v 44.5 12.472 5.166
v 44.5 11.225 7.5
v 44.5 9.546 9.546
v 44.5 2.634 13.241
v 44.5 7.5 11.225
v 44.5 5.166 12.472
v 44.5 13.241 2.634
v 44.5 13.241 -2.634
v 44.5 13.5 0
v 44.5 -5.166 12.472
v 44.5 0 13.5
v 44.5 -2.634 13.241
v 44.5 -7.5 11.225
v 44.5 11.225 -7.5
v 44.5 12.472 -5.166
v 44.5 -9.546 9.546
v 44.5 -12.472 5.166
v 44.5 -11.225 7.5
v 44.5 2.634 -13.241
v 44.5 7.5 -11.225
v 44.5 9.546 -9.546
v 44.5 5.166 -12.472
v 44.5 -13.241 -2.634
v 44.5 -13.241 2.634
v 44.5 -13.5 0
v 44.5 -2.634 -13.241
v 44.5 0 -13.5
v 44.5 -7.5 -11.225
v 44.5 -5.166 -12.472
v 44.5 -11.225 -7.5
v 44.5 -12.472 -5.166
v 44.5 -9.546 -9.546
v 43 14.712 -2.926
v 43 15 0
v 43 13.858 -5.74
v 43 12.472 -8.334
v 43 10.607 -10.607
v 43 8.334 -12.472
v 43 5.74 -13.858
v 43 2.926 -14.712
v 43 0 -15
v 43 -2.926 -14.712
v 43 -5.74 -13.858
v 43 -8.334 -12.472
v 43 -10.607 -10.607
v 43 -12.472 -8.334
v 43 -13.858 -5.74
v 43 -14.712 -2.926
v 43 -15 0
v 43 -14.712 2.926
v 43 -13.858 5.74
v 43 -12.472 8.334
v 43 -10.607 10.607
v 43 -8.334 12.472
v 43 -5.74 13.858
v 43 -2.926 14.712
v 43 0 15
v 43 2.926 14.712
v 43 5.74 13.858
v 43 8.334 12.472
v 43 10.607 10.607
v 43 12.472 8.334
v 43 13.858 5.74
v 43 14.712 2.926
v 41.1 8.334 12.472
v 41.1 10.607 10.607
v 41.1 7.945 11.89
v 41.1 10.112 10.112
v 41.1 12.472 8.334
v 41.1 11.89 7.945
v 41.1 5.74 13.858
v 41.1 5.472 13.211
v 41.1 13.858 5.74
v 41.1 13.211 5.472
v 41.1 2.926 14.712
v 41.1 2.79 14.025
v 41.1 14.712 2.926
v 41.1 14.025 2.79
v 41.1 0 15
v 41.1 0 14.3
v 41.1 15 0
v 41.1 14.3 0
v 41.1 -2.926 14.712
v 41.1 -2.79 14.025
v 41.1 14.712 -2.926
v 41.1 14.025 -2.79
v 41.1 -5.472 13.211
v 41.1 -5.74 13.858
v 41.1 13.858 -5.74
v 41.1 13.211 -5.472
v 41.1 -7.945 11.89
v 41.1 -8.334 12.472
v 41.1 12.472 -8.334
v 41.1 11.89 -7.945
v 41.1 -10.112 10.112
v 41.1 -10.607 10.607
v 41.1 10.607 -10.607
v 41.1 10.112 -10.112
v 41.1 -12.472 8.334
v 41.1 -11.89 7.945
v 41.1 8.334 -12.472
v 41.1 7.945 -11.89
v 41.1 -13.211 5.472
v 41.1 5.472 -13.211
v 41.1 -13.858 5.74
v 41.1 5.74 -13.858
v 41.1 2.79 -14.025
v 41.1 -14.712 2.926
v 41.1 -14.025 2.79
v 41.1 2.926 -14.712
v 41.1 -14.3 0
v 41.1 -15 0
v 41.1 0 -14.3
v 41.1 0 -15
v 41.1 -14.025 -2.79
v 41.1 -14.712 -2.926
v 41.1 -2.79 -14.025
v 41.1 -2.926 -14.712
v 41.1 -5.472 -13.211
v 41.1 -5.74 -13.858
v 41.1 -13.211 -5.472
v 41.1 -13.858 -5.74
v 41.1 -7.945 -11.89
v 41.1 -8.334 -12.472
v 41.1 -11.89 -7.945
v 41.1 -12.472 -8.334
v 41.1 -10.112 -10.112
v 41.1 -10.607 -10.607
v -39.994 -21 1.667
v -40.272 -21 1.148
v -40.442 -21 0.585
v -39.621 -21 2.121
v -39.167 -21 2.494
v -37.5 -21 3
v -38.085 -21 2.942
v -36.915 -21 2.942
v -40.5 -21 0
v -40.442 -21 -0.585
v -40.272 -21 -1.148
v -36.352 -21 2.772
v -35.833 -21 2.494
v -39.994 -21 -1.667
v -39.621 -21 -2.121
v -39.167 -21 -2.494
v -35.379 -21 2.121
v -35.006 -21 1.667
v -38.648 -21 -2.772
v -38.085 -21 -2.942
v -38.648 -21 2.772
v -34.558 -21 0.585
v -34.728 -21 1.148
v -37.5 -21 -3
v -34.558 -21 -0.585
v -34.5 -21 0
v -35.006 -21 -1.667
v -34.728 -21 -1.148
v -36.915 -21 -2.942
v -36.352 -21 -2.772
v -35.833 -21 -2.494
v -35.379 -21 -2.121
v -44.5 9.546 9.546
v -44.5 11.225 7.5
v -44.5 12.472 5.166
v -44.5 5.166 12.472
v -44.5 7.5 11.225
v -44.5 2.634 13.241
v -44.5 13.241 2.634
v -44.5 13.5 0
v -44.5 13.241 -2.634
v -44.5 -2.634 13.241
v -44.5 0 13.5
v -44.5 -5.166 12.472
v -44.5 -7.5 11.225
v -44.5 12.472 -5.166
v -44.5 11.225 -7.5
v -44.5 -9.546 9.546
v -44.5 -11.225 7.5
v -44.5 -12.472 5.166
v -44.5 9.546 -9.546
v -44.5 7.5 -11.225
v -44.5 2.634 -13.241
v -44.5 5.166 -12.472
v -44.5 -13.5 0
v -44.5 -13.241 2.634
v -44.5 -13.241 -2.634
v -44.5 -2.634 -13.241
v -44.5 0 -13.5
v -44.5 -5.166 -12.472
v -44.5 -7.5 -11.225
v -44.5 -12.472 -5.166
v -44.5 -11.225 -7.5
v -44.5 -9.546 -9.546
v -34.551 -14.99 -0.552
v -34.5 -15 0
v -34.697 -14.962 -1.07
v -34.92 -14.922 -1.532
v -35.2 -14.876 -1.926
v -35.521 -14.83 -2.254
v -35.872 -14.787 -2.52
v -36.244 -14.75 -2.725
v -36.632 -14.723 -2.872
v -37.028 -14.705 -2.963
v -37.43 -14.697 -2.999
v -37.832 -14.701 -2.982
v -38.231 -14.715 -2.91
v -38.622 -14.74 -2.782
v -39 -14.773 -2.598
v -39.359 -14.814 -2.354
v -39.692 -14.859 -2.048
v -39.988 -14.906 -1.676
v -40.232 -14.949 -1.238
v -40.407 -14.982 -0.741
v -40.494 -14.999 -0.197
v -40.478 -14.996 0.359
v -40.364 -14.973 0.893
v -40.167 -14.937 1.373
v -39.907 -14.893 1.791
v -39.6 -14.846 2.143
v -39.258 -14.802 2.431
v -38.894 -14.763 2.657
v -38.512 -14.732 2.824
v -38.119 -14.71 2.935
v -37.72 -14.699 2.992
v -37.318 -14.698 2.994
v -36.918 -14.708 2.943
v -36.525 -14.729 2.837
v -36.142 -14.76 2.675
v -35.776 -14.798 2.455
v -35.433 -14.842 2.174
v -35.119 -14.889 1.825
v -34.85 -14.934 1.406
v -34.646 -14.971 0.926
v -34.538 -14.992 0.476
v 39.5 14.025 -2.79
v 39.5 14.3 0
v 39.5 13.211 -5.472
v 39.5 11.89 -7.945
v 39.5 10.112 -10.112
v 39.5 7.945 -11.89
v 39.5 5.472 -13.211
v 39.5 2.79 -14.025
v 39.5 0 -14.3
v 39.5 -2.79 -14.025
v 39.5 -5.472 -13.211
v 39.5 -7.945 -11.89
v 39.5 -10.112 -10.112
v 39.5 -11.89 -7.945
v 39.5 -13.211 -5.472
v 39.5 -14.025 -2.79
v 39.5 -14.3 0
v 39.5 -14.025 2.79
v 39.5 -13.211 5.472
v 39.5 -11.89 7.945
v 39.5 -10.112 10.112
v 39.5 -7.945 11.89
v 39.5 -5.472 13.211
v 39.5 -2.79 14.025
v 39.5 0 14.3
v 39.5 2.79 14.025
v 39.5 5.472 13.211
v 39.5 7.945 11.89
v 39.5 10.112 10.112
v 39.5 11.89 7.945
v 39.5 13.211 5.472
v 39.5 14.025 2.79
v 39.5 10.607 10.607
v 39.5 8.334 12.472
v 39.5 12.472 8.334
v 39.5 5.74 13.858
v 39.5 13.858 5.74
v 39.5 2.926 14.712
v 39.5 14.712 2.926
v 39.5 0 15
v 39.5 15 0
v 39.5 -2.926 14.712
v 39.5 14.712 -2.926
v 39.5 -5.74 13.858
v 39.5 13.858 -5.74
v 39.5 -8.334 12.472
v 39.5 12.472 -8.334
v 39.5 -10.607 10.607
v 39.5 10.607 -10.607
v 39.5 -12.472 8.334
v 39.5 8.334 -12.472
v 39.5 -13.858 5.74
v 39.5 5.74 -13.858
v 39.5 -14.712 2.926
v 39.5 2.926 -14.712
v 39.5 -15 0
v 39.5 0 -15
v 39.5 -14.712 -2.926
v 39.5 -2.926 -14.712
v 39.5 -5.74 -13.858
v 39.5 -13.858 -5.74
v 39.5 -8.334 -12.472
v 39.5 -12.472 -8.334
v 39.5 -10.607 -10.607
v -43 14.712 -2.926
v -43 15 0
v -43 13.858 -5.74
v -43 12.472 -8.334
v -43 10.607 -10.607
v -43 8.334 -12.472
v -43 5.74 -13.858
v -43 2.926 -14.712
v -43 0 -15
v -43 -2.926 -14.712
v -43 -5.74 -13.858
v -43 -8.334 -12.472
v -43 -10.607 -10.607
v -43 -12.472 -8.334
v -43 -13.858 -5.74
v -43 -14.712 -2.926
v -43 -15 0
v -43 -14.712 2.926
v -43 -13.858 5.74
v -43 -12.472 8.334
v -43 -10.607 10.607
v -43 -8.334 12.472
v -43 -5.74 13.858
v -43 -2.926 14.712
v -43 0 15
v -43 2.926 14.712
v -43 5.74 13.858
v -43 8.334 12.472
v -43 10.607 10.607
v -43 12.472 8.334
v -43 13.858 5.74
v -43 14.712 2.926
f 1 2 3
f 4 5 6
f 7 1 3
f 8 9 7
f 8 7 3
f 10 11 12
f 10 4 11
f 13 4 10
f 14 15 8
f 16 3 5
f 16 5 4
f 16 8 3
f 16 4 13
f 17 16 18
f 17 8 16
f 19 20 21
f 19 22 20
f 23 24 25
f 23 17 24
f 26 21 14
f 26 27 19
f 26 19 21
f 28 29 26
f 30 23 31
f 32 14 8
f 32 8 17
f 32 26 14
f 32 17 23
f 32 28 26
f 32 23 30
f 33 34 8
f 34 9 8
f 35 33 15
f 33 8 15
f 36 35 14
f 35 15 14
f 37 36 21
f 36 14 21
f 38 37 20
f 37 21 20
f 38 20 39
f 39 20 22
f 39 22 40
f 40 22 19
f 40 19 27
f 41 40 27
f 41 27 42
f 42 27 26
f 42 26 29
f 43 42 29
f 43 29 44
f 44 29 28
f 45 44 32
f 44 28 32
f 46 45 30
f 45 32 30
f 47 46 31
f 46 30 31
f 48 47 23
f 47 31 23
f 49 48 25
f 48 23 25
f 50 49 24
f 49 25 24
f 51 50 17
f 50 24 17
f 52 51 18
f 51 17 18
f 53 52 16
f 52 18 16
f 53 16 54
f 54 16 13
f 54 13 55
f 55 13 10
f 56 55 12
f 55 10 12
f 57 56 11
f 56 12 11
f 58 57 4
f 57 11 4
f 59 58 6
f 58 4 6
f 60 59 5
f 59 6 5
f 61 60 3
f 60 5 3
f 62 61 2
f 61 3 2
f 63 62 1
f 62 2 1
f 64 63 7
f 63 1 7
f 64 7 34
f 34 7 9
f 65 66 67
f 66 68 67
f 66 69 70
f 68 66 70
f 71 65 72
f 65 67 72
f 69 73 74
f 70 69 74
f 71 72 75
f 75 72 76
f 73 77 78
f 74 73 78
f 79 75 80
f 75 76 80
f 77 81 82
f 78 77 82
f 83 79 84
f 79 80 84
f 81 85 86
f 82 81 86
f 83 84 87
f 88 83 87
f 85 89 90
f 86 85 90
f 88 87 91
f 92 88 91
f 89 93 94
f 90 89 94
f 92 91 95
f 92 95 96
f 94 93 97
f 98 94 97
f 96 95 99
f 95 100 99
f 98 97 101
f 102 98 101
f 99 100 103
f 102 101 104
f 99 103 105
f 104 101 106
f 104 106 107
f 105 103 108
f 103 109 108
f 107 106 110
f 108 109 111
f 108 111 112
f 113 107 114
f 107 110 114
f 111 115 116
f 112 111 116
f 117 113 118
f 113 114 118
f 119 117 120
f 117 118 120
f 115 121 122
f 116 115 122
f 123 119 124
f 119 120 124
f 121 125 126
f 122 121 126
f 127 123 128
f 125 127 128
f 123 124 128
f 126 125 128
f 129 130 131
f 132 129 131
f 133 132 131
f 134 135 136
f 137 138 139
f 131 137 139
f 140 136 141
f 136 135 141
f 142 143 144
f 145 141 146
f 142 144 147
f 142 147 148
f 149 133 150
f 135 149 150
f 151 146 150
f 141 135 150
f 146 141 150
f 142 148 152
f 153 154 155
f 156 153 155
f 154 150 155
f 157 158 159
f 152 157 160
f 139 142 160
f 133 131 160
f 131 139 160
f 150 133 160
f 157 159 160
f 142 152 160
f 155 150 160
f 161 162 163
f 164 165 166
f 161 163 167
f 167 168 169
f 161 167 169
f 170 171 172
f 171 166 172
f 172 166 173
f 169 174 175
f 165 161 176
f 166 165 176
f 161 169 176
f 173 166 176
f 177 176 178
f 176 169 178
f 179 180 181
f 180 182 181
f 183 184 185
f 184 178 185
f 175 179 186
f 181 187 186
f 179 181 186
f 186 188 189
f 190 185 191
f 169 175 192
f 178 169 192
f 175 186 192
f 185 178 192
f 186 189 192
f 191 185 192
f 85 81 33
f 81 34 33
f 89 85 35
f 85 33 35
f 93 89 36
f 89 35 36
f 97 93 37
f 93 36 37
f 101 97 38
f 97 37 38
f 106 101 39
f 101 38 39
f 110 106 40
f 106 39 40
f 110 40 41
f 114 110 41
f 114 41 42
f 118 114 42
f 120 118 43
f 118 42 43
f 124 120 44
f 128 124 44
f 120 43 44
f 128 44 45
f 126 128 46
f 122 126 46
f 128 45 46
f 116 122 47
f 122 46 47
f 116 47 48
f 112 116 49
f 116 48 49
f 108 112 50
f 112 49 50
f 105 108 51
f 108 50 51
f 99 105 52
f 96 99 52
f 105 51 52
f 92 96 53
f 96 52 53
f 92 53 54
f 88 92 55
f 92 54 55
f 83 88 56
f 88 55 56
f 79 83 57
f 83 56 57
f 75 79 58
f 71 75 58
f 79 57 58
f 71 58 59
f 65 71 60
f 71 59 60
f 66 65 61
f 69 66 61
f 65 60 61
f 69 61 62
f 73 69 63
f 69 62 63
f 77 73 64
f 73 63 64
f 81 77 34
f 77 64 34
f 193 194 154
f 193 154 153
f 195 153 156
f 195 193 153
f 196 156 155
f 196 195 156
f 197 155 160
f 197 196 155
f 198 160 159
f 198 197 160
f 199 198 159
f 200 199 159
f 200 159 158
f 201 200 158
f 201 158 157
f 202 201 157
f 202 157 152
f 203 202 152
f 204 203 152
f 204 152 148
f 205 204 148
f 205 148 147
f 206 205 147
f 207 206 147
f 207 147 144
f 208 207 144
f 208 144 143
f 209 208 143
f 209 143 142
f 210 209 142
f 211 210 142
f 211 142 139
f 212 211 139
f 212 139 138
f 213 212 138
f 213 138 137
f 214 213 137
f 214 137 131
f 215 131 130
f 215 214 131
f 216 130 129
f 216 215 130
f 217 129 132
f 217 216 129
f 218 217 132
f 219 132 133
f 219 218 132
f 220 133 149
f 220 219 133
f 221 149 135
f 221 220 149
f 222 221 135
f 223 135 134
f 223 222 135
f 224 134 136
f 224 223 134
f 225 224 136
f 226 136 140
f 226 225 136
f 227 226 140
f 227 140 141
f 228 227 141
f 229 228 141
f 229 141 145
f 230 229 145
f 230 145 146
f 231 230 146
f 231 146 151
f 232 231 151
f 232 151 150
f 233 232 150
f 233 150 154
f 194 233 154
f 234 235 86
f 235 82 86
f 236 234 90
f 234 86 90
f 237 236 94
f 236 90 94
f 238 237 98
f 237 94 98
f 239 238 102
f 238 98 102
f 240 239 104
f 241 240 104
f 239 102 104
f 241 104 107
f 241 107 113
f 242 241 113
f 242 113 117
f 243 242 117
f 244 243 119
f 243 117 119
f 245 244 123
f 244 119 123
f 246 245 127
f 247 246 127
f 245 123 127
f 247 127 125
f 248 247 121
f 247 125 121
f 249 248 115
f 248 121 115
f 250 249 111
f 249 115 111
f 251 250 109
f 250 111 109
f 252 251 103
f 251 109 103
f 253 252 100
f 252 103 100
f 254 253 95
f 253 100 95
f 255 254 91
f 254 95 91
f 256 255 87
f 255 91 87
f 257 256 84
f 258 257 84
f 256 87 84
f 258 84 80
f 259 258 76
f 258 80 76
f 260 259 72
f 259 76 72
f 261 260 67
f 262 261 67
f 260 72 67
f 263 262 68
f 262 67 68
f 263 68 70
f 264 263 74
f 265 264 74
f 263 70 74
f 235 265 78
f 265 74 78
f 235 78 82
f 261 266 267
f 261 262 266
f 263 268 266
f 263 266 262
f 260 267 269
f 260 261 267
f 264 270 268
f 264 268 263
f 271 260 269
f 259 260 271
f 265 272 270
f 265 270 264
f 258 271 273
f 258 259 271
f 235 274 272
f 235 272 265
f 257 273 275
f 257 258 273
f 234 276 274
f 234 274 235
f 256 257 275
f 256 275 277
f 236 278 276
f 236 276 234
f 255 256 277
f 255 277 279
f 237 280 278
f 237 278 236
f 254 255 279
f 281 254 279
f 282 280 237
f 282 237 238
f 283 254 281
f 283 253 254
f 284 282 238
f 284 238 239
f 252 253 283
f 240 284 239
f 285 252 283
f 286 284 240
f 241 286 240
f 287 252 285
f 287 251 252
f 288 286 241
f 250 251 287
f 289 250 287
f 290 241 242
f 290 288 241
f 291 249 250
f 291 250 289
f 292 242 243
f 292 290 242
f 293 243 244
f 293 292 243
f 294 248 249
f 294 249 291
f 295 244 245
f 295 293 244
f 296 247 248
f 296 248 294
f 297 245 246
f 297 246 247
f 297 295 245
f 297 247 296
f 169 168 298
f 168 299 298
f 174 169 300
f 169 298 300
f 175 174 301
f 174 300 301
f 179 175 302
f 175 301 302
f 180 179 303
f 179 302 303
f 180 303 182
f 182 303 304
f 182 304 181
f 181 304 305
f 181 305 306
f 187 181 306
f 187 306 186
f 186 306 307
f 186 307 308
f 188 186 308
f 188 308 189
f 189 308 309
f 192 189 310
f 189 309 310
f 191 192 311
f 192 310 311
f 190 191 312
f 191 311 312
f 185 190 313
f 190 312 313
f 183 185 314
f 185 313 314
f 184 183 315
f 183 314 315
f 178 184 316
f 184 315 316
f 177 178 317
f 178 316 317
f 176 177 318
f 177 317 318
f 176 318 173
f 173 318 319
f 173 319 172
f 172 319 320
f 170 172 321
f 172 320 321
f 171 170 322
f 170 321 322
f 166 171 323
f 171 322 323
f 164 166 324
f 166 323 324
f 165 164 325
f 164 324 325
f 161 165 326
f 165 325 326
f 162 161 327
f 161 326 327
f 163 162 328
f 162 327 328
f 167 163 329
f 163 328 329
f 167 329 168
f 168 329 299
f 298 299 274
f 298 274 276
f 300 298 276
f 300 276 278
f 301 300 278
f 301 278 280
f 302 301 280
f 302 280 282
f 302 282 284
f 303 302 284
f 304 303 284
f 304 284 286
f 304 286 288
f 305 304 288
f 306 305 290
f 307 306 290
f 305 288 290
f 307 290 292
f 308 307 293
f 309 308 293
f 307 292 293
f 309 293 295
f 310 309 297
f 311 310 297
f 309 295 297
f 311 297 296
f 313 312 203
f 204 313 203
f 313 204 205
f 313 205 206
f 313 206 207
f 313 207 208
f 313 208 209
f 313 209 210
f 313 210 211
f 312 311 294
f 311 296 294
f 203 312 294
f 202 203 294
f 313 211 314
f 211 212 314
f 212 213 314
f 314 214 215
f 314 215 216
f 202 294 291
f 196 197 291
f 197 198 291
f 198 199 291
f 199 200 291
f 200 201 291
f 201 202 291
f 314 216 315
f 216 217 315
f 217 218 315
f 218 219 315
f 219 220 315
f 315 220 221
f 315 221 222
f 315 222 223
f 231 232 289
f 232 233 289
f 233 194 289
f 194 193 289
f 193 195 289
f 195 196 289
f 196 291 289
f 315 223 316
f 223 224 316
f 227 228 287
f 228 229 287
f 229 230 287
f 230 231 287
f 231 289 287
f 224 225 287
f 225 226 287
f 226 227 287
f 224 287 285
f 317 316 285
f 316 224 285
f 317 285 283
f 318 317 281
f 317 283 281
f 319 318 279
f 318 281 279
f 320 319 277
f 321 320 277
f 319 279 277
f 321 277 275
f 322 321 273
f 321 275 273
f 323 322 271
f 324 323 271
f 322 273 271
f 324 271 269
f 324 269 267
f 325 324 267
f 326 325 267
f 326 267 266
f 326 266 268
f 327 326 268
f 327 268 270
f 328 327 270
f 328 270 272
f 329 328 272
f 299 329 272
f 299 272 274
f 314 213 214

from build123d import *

# Parameters (mm, degrees)
SKETCH1_W           = 84
SKETCH1_H           = 15
SKETCH3_R           = 3
BOSS_EXTRUDE1_DEPTH = 21
SKETCH4_W           = 5
SKETCH4_H           = 15
SKETCH5_W           = 1.6
SKETCH5_H           = 0.7


with BuildPart() as part:
    # Sketch1 → Revolve1 (revolve)
    with BuildSketch(Plane.XY):
        with Locations((-2.5, 7.5)):
            Rectangle(SKETCH1_W, SKETCH1_H)
    revolve(axis=Axis((39.5, 0, 0), (-1, 0, 0)))

    # Sketch2 → Cut-Revolve1 (revolve, cut)
    with BuildSketch(Plane.XY):
        Polygon((-44.5, 13.5), (-43, 15), (-44.5, 15), align=None)
    revolve(axis=Axis((77, 0, 0), (-1, 0, 0)), mode=Mode.SUBTRACT)

    # Sketch3 → Boss-Extrude1 (add)
    with BuildSketch(Plane(origin=(0, 0, 0), x_dir=(1, 0, 0), z_dir=(0, 1, 0))):
        with Locations((-37.5, 0)):
            Circle(SKETCH3_R)
    extrude(amount=-BOSS_EXTRUDE1_DEPTH)

    # Sketch4 → Revolve2 (revolve)
    with BuildSketch(Plane.XY):
        with Locations((42, 7.5)):
            Rectangle(SKETCH4_W, SKETCH4_H)
    revolve(axis=Axis((44.5, 0, 0), (-1, 0, 0)))

    # Sketch5 → Cut-Revolve2 (revolve, cut)
    with BuildSketch(Plane.XY):
        with Locations((40.3, 14.65)):
            Rectangle(SKETCH5_W, SKETCH5_H)
    revolve(axis=Axis((77, 0, 0), (-1, 0, 0)), mode=Mode.SUBTRACT)

    # Sketch6 → Cut-Revolve3 (revolve, cut)
    with BuildSketch(Plane.XY):
        Polygon((43, 15), (44.5, 13.5), (44.5, 15), align=None)
    revolve(axis=Axis((77, 0, 0), (-1, 0, 0)), mode=Mode.SUBTRACT)


solid = part.part
